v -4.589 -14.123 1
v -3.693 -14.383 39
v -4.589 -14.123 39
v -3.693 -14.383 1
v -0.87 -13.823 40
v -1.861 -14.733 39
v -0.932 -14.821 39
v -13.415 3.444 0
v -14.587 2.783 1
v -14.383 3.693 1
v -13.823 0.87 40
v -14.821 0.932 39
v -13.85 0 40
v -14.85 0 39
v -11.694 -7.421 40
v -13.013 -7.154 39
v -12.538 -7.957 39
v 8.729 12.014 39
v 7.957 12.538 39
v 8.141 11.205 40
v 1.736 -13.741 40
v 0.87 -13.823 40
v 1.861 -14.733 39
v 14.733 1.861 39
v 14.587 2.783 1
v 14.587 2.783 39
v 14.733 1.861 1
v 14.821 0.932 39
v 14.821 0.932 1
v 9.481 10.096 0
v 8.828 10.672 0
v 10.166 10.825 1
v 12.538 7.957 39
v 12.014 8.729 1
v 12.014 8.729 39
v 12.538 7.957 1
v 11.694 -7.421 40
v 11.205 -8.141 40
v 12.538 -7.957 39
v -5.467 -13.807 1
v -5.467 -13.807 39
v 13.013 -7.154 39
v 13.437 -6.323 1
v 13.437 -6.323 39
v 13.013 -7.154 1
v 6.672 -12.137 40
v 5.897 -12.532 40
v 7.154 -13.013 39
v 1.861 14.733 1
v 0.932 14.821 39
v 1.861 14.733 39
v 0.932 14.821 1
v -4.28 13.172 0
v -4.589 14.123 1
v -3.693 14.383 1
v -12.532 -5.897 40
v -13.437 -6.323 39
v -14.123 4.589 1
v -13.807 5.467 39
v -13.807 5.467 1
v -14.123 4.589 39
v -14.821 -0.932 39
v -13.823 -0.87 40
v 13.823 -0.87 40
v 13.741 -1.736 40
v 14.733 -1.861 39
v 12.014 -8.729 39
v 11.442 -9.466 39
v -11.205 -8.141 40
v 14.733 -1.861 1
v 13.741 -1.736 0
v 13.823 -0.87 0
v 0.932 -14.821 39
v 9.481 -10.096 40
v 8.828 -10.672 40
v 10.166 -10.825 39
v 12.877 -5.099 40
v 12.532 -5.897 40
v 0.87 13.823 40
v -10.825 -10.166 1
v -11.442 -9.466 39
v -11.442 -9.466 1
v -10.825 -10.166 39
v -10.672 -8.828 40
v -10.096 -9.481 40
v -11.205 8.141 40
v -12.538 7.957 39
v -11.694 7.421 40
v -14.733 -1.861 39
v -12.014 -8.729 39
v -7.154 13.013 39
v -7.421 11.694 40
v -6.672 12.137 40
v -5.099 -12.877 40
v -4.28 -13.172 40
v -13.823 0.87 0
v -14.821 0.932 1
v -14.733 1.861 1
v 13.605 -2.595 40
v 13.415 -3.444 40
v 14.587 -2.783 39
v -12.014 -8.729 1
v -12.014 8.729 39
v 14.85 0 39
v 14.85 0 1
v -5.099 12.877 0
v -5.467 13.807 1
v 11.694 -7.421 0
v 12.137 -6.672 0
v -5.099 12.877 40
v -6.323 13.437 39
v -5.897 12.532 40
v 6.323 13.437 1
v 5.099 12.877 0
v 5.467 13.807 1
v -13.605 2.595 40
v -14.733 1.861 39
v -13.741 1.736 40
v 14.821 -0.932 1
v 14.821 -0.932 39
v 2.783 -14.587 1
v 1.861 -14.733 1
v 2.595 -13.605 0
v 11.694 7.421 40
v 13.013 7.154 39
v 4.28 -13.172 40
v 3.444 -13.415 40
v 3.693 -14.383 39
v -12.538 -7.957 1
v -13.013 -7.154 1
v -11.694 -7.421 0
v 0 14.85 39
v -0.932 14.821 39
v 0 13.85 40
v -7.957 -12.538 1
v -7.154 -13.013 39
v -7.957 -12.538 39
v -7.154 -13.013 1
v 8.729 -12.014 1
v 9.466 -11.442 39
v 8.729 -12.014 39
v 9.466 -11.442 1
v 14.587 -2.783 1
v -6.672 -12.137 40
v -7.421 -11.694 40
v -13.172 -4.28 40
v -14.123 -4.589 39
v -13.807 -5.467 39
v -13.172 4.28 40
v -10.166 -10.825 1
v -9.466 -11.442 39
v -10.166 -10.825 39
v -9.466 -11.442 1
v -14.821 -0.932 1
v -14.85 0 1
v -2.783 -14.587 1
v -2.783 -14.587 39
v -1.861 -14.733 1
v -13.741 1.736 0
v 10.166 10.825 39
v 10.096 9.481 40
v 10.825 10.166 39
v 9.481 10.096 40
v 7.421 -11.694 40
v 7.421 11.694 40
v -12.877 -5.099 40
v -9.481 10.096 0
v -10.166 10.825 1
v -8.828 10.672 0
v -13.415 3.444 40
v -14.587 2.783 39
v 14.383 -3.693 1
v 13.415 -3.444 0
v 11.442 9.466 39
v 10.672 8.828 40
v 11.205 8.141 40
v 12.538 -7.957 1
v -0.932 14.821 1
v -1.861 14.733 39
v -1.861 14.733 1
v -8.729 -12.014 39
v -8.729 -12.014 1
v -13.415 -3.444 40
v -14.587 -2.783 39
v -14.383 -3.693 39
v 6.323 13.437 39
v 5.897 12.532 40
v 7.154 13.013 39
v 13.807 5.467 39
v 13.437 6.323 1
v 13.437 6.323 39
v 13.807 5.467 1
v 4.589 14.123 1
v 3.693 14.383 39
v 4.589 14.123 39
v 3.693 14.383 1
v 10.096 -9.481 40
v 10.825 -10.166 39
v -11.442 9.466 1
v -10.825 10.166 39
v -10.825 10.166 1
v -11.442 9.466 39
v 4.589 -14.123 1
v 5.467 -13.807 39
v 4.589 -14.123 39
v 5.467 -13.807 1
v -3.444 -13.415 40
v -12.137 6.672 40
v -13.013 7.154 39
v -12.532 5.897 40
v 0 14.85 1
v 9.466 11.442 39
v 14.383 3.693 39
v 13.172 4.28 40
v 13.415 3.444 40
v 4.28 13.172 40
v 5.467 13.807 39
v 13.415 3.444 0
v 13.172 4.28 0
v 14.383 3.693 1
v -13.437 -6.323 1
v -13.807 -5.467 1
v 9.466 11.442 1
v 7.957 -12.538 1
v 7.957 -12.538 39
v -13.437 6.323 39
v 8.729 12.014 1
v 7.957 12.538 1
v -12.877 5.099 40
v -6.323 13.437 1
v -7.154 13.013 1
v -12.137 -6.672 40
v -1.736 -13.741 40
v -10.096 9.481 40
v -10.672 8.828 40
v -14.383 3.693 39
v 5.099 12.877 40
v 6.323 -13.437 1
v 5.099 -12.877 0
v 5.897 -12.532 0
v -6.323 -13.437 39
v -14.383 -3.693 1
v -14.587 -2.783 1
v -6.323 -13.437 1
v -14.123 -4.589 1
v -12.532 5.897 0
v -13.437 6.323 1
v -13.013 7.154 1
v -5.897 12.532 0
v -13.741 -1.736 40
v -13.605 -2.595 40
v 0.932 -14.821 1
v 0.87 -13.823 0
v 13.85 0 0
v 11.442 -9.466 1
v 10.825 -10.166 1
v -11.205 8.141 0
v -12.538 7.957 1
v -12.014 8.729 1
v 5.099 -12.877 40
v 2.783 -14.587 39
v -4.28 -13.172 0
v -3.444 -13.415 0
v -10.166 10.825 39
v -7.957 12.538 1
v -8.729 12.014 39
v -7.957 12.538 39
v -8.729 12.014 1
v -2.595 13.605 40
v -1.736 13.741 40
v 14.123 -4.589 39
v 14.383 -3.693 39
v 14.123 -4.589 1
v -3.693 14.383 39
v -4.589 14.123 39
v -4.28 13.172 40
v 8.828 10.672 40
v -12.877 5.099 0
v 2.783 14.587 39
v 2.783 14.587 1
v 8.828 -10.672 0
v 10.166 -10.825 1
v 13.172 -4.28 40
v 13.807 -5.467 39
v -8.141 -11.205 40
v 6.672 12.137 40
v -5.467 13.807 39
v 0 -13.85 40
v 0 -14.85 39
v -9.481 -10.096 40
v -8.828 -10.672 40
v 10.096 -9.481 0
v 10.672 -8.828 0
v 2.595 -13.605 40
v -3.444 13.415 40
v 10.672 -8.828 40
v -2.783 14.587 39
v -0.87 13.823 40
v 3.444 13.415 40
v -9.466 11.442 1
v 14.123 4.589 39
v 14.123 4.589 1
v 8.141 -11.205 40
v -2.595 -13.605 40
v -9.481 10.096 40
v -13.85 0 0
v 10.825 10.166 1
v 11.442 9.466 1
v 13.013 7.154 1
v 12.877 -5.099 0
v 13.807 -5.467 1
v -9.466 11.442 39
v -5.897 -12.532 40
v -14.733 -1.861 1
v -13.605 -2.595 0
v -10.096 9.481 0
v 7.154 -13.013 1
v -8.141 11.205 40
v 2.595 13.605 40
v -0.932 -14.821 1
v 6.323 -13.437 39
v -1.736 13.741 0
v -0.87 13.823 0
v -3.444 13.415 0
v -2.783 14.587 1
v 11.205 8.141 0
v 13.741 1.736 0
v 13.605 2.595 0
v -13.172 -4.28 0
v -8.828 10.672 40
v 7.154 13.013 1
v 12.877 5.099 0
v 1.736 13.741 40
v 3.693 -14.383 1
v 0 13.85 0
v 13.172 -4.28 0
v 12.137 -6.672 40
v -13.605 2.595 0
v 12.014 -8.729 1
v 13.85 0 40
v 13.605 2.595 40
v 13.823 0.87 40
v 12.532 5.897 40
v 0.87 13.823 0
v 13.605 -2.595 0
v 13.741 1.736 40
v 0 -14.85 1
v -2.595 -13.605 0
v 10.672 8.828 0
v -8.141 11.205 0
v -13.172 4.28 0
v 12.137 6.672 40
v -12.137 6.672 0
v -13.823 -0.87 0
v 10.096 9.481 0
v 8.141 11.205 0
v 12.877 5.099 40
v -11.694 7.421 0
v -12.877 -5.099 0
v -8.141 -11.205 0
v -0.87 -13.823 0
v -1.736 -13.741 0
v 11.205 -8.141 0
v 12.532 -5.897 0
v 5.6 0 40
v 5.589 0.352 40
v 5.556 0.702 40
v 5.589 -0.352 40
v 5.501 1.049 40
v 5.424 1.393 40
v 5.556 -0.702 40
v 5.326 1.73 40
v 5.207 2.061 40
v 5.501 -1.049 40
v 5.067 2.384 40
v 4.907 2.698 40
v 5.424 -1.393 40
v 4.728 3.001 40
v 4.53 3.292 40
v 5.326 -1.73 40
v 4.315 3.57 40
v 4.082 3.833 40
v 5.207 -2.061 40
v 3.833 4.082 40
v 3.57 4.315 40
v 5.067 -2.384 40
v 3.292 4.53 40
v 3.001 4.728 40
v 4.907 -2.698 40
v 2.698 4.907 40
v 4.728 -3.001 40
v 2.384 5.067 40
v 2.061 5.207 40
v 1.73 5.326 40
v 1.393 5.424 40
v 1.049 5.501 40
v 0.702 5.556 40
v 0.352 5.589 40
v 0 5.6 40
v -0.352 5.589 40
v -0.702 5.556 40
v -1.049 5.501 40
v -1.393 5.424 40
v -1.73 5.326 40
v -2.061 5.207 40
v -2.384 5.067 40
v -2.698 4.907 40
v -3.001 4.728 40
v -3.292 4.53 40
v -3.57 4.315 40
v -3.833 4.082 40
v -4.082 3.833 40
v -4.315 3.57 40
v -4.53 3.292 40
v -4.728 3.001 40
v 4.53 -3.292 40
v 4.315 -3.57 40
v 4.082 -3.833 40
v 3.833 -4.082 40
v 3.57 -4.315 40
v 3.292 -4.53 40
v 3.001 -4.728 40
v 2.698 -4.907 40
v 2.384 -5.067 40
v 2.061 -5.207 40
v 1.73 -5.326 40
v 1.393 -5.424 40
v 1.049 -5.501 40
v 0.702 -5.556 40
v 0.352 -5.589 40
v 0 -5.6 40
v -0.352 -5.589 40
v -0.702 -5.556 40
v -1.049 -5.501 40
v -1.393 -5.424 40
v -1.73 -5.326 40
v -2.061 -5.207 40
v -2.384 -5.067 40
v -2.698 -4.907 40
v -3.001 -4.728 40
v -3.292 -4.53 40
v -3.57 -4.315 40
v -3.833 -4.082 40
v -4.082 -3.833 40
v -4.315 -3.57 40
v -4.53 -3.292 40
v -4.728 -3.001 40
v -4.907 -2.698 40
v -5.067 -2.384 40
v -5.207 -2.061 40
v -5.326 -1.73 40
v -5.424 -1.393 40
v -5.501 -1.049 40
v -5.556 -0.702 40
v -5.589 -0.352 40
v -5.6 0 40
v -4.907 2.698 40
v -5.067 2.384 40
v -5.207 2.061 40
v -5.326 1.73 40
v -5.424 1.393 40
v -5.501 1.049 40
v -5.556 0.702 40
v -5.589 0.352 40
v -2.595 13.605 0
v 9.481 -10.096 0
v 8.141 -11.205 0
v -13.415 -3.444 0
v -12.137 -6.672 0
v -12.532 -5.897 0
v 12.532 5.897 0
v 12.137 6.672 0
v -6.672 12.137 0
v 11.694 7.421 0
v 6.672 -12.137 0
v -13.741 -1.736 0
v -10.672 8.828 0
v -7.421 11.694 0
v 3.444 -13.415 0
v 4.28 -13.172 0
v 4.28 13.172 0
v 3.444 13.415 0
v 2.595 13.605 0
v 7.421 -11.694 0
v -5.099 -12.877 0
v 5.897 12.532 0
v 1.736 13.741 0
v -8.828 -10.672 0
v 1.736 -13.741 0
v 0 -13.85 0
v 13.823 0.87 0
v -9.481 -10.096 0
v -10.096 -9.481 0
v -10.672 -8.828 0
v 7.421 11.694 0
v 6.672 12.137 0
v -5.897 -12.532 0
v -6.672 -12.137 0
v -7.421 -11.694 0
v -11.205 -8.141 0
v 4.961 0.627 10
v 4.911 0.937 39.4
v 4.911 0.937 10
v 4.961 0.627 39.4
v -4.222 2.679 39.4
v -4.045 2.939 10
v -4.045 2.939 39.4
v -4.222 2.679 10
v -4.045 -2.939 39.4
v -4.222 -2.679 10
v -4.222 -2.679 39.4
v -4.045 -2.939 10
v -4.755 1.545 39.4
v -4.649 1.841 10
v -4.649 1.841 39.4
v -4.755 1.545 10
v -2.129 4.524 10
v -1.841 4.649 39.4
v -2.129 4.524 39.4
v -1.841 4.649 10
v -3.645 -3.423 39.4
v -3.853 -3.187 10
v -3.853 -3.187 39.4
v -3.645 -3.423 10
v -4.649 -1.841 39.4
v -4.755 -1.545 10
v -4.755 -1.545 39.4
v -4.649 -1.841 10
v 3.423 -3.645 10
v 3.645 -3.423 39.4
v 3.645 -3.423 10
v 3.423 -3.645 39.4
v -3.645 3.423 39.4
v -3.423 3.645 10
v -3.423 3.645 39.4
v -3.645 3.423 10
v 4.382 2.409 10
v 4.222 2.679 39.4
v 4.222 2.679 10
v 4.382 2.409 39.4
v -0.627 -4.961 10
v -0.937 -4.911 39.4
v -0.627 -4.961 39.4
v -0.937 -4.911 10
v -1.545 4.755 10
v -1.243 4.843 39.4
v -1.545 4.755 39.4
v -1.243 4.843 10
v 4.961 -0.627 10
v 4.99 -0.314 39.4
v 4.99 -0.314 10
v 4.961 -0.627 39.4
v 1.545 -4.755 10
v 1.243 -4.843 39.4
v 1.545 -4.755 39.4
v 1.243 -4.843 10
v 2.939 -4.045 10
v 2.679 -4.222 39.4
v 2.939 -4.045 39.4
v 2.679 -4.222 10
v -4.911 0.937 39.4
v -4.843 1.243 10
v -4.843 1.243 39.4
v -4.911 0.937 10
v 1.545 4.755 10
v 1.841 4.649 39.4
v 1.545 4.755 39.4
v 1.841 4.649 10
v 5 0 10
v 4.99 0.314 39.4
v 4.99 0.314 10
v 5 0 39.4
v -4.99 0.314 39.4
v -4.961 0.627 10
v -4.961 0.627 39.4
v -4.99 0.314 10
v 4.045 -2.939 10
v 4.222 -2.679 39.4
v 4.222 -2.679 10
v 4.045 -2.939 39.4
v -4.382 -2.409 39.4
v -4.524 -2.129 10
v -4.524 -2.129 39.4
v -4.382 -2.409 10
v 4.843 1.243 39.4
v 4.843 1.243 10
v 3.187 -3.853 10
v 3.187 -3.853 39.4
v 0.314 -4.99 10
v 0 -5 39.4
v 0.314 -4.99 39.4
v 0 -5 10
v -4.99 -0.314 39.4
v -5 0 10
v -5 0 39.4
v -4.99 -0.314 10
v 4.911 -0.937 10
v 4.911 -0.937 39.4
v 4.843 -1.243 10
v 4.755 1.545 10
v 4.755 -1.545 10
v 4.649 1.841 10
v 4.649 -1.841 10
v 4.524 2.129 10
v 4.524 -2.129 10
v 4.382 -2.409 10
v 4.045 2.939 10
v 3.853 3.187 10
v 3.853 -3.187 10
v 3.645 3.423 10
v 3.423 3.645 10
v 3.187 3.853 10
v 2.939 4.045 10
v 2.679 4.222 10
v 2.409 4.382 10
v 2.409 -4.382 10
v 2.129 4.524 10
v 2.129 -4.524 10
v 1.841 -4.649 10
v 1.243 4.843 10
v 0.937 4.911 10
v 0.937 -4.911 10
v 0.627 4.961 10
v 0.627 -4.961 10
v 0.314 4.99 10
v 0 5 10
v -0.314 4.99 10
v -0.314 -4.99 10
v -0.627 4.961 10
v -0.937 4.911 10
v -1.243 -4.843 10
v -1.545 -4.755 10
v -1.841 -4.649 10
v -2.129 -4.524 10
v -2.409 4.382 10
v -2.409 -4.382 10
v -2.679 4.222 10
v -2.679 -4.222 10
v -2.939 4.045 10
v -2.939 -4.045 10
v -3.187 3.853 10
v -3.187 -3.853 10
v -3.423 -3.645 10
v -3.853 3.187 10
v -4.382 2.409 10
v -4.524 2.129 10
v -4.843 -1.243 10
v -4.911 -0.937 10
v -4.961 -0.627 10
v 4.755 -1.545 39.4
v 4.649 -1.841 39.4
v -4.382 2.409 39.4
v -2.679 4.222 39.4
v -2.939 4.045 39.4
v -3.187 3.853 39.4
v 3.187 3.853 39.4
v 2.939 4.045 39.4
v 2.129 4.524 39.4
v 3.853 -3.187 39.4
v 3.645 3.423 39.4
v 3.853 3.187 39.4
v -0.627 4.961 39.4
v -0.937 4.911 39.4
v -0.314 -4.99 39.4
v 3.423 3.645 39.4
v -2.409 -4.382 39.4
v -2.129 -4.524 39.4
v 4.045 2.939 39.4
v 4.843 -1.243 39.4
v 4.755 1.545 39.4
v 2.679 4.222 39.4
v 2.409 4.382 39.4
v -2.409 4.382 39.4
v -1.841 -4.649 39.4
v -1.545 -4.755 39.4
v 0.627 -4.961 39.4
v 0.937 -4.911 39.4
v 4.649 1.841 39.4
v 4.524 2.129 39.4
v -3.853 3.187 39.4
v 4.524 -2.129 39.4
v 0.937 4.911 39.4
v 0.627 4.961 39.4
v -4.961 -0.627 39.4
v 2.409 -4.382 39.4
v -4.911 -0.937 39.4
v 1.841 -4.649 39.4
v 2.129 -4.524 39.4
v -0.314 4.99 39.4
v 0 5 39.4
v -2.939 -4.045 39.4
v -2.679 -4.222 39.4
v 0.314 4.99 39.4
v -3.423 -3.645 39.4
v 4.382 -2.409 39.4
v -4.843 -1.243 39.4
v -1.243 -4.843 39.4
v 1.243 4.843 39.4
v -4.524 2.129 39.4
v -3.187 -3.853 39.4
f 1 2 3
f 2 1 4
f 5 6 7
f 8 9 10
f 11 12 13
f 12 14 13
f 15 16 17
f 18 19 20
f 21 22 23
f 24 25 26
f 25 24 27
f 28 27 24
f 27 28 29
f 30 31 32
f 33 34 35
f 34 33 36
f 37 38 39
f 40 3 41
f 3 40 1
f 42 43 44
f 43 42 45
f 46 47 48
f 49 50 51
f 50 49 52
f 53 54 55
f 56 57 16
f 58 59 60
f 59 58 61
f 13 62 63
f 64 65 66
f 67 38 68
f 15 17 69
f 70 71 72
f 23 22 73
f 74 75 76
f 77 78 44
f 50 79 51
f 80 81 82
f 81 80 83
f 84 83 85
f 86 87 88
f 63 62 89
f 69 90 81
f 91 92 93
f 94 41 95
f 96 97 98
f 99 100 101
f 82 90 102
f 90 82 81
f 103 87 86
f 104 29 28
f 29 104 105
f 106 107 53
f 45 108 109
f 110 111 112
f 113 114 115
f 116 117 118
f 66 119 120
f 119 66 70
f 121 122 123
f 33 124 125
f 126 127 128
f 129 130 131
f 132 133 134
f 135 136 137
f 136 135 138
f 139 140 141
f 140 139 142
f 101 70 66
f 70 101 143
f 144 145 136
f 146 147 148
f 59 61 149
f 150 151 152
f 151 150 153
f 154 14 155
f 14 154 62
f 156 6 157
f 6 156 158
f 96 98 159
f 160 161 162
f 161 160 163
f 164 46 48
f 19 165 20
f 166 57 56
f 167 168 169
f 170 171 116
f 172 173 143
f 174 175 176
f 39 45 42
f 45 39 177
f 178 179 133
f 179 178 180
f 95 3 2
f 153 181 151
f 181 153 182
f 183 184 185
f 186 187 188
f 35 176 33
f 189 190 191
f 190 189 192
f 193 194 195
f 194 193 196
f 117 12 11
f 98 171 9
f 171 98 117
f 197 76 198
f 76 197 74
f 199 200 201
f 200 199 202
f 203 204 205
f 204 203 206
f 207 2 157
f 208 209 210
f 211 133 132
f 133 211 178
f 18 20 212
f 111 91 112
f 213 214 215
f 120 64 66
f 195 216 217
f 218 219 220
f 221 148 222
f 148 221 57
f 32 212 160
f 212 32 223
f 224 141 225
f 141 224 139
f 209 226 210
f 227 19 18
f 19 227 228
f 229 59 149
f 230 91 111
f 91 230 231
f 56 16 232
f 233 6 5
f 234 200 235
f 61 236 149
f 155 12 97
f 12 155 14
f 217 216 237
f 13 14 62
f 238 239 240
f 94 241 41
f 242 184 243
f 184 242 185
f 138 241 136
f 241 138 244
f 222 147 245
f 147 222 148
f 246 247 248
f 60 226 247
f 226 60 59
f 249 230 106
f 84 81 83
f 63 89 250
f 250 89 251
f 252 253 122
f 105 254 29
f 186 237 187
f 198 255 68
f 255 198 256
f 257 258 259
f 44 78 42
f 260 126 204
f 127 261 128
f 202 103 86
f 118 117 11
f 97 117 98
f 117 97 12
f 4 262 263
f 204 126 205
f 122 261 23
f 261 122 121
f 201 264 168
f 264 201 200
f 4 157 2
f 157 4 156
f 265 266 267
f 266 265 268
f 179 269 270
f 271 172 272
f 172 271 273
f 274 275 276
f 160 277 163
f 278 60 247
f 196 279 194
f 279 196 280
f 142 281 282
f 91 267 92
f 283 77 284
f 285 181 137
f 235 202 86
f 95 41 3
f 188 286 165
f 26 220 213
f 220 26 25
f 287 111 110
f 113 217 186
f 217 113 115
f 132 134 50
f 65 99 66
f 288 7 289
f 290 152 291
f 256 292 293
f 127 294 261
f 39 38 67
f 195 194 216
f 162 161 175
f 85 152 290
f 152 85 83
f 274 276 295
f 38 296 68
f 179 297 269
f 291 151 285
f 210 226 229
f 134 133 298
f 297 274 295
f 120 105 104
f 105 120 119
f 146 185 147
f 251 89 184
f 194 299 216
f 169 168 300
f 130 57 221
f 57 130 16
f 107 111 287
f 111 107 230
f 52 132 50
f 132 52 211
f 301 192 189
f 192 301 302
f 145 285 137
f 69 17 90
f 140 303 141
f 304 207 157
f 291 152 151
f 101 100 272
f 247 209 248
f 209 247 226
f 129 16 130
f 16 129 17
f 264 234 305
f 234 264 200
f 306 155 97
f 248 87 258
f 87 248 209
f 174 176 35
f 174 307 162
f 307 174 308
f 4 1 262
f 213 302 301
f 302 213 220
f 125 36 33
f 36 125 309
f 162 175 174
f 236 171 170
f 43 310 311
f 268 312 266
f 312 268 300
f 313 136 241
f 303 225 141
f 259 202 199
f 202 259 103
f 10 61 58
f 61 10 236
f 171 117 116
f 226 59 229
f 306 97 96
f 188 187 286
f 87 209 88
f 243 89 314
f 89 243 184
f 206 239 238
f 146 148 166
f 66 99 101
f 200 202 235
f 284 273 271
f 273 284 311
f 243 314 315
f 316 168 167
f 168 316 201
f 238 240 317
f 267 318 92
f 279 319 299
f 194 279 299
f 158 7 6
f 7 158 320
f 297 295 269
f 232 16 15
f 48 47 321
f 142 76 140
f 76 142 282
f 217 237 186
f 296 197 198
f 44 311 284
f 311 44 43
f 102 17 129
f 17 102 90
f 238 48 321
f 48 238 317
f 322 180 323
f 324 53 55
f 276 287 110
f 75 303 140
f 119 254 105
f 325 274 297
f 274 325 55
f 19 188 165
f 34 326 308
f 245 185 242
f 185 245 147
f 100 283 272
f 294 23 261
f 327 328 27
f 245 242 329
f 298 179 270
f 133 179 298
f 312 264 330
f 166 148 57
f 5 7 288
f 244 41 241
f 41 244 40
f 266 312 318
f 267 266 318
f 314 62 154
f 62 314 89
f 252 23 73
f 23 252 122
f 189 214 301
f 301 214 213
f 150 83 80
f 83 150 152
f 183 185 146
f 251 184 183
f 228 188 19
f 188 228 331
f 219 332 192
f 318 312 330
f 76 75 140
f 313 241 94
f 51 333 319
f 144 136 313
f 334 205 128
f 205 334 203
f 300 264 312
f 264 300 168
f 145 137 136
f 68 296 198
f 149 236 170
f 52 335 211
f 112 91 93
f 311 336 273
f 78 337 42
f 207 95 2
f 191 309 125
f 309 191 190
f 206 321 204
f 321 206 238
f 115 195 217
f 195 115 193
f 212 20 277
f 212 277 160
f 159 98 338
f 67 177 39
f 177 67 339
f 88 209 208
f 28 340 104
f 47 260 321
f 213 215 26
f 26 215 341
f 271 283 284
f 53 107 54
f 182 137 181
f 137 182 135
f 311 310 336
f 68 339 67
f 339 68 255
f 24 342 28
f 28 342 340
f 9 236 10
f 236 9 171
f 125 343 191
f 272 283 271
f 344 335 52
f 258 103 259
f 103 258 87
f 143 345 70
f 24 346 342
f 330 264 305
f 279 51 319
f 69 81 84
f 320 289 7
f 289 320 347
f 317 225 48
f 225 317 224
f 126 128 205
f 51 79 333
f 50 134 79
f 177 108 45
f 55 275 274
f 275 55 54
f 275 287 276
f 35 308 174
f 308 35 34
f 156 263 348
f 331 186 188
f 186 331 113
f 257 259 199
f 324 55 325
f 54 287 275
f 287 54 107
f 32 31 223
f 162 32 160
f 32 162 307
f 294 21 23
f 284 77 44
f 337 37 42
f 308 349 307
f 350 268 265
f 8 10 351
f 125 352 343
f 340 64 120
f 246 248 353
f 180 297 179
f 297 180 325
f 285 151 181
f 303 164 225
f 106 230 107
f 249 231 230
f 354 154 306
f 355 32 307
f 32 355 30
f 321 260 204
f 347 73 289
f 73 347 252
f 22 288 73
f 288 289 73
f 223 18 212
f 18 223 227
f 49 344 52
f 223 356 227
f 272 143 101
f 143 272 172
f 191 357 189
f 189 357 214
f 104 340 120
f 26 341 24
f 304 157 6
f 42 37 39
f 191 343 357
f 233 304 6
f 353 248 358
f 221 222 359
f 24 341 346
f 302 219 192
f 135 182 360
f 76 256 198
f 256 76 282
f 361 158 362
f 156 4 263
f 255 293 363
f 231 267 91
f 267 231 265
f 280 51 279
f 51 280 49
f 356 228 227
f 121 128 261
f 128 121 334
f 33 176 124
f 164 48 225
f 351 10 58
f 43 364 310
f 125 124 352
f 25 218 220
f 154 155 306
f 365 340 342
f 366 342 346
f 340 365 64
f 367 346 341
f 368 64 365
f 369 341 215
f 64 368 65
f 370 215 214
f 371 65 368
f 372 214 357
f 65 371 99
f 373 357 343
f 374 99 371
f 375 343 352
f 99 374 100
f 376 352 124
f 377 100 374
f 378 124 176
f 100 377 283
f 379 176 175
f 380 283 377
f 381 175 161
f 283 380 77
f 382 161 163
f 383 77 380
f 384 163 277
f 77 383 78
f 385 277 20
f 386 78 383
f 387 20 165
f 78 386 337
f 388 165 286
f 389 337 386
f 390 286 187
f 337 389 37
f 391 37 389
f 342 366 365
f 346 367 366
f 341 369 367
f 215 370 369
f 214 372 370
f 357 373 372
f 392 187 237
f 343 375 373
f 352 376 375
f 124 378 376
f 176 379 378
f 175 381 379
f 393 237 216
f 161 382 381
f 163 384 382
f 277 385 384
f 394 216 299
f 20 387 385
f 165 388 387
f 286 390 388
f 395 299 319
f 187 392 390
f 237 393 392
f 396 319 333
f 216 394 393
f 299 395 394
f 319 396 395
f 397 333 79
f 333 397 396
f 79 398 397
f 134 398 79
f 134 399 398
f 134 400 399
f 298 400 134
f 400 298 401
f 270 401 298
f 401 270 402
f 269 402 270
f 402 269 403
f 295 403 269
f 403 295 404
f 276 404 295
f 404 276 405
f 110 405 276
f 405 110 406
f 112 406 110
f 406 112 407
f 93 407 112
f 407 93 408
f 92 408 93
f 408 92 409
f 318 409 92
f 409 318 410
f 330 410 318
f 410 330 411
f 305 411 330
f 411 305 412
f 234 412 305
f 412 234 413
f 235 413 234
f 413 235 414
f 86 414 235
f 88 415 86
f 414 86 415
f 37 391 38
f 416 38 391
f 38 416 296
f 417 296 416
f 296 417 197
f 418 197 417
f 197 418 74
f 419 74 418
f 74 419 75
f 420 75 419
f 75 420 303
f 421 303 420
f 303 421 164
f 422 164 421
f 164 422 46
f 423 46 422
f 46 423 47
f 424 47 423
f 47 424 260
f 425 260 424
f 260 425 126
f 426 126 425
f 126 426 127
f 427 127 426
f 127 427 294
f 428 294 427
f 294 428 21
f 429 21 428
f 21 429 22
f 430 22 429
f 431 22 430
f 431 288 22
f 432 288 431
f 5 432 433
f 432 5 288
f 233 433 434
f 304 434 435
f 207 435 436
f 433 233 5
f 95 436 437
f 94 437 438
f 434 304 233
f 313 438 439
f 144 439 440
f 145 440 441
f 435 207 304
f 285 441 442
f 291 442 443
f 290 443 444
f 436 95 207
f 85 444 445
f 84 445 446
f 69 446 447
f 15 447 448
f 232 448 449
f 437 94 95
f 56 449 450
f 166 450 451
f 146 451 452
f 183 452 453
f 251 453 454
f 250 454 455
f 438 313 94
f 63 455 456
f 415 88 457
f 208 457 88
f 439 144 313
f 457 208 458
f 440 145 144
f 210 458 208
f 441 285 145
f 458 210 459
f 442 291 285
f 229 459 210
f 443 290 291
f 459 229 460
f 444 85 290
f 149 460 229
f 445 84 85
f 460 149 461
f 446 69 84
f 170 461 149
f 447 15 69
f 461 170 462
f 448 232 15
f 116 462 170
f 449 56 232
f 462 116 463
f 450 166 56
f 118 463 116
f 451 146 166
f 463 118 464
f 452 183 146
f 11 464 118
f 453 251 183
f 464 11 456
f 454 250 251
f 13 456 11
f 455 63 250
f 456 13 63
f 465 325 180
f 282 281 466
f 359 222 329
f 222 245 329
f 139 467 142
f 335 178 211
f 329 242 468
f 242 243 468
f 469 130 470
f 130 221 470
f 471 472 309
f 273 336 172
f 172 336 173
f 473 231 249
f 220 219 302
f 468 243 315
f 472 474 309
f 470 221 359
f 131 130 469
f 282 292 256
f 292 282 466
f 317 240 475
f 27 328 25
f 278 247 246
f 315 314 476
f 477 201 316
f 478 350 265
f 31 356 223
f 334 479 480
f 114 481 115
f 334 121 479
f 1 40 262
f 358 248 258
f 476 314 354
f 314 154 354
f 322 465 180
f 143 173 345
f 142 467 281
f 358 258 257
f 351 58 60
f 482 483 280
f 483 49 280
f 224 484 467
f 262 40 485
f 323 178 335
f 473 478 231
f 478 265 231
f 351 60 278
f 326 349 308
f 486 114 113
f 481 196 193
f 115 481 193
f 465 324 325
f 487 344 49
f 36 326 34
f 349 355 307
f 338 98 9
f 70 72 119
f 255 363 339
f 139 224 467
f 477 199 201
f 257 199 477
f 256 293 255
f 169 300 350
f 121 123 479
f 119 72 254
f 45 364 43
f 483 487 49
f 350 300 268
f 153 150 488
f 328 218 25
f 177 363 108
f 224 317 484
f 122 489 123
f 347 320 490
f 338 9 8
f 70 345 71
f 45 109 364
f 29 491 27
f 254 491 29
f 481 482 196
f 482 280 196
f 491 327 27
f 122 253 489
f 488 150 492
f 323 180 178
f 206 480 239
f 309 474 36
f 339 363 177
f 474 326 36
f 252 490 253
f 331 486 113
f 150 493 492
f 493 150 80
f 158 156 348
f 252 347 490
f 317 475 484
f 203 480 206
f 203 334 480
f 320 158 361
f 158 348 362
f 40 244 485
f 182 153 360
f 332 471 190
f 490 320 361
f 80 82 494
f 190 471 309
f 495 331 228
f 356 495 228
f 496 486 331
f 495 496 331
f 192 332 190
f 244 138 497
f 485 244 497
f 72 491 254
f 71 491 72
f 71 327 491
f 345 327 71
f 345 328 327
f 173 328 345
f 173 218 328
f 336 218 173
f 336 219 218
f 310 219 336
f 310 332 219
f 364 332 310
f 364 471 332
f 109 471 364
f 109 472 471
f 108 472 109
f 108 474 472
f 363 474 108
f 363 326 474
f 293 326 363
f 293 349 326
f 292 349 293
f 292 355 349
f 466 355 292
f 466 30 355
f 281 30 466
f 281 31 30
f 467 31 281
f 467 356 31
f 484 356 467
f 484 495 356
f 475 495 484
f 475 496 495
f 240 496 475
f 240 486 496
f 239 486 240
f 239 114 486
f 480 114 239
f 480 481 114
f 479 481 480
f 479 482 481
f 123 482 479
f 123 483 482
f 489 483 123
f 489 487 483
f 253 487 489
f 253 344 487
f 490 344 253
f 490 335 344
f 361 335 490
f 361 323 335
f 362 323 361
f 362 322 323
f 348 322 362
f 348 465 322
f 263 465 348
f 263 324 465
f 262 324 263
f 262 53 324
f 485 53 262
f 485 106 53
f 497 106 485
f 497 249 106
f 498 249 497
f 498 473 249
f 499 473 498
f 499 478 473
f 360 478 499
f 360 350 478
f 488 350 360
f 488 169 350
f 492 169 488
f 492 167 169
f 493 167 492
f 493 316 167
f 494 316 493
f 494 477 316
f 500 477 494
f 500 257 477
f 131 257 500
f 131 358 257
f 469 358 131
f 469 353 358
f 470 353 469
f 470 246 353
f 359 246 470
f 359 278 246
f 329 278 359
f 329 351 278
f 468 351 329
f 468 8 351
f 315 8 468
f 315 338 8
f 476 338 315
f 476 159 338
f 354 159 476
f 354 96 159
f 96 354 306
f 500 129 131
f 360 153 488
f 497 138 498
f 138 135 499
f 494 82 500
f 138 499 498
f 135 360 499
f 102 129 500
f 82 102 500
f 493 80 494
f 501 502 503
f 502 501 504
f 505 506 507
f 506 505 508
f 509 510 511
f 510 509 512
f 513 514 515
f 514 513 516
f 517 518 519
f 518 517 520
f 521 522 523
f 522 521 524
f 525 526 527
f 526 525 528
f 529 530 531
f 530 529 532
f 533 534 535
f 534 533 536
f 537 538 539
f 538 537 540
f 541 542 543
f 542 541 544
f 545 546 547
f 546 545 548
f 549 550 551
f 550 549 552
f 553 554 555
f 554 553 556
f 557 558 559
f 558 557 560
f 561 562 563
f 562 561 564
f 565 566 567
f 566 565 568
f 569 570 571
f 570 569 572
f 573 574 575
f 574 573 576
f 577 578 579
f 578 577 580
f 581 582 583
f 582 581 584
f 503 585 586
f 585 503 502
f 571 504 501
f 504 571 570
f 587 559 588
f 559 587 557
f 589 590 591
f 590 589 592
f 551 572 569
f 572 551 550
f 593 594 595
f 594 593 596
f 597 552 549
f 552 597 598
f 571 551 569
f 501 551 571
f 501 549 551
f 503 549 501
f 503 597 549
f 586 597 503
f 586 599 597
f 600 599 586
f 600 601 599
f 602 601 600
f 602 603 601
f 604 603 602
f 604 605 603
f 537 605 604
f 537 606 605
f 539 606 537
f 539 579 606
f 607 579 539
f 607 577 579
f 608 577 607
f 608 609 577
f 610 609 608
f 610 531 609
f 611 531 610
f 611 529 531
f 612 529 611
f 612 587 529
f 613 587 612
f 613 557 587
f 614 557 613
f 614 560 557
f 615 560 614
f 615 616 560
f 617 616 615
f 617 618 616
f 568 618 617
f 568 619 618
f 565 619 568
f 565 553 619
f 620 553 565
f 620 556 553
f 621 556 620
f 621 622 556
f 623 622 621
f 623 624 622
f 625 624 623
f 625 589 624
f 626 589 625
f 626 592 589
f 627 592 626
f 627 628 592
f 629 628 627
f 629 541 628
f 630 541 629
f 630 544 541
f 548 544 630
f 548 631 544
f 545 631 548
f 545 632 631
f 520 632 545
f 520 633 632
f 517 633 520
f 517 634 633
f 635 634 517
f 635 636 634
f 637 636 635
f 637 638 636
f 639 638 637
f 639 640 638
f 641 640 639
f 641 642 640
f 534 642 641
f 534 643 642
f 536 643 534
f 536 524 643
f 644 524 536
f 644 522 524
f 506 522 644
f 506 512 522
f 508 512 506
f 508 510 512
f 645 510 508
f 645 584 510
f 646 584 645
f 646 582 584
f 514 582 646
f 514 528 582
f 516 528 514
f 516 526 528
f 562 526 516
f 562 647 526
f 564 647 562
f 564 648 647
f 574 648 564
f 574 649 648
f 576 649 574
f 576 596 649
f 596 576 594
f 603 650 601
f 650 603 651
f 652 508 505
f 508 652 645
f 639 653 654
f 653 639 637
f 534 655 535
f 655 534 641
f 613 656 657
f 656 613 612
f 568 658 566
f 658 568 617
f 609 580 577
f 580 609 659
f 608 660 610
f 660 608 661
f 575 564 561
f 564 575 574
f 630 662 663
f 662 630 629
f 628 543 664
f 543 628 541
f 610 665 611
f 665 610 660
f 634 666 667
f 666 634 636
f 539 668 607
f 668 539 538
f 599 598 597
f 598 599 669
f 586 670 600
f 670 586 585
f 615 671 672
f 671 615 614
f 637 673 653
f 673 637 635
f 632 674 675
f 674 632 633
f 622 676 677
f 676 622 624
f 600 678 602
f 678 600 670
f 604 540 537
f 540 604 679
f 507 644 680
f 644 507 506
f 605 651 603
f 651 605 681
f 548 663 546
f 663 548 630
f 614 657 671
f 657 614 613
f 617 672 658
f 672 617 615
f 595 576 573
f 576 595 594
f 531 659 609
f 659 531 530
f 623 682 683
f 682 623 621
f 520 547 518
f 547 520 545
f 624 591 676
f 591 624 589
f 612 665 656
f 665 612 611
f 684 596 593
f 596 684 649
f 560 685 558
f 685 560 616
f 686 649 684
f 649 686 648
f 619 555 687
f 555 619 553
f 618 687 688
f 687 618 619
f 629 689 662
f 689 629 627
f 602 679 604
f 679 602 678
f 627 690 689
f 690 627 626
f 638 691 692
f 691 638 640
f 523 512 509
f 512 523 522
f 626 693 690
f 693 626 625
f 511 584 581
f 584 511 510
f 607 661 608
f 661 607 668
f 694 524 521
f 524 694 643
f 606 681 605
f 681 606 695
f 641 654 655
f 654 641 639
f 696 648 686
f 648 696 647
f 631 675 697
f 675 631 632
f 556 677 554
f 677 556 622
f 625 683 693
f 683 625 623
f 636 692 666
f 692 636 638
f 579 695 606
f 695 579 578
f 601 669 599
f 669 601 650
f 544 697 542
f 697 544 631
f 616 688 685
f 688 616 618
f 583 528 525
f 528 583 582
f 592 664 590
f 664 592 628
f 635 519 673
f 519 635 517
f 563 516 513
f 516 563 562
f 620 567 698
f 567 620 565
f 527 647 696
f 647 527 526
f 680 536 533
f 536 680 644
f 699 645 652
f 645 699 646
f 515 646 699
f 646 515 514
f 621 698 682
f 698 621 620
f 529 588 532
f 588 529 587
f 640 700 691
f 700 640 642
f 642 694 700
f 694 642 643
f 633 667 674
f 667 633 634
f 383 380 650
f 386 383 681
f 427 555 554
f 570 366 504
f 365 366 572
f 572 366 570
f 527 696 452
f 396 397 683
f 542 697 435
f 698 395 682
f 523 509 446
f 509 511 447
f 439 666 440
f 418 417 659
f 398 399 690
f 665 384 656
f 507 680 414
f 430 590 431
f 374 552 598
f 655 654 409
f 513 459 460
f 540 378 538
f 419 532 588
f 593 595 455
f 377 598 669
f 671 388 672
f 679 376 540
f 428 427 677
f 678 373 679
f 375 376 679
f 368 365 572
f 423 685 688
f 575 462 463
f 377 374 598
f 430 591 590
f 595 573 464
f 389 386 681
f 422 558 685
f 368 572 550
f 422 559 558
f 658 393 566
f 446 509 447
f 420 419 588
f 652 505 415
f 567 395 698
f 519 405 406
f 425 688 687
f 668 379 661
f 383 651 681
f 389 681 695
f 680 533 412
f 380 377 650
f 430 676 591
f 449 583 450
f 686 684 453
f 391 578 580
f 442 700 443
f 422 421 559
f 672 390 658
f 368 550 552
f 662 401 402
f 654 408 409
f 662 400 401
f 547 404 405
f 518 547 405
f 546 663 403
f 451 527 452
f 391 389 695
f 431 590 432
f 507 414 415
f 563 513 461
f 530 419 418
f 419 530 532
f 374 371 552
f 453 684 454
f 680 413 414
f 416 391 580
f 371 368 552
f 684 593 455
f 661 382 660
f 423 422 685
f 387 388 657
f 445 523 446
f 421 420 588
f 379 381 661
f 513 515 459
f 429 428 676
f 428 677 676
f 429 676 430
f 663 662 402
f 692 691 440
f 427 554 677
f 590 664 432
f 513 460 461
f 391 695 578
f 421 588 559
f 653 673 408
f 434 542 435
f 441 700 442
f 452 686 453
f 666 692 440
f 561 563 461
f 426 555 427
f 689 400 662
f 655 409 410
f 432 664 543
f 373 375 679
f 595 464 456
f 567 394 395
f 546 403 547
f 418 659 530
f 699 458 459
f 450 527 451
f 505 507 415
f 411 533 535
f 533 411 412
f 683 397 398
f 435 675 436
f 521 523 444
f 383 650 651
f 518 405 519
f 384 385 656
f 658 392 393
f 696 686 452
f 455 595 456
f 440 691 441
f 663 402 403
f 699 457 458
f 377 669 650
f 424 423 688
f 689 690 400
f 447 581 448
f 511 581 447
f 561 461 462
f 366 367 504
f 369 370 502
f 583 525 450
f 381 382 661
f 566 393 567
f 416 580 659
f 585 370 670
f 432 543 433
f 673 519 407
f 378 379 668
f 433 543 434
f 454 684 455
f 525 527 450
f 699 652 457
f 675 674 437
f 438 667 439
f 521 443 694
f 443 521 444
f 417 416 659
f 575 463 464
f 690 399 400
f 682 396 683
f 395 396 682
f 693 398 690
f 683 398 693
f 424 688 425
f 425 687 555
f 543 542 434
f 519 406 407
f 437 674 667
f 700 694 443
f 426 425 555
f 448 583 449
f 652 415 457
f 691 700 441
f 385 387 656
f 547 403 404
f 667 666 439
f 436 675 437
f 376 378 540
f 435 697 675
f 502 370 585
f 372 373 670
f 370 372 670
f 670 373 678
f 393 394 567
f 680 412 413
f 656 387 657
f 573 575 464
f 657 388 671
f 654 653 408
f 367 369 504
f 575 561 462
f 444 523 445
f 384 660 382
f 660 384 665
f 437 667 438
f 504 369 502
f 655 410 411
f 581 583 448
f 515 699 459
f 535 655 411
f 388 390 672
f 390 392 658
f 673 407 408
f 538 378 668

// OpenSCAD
// SPDX-License-Identifier: CC-BY-4.0
// SPDX-FileCopyrightText: 2026 Todd Sayre
// ============================================================
// Dowel end cap — a blind socket that closes off a dowel end
//
// A plain cylinder with a cylindrical recess bored into one
// end. The dowel pushes into the recess until it bottoms out;
// the remaining material caps the end.
//
// Optionally a countersunk screw hole runs through the closed
// end, so a flat-head screw can pull the cap down onto the
// dowel instead of the fit or a glue line holding it there.
//
// Modeled mouth up, closed end on the plate.
//
// The cap DEFINES its own proportions from one measurement.
// Everything is driven by the dowel diameter plus the meat you
// want around it, so the outside diameter and the overall
// length both fall out of the numbers below rather than being
// set directly.
//
// The recess is a dimension inside a hollow solid, so it is
// never measured — it is bored to the dowel diameter plus a
// clearance knob. Measure the dowel, not the hole you want.
//
// PRINT NOTES:
// - PETG or PLA, no supports needed.
// - Print as modeled, closed end down. The bore opens upward,
//   so nothing bridges, and the visible end face is laid
//   against the plate. Flipped, the bore roof has to bridge
//   its full width — it works, but it leaves a rough ceiling
//   for the dowel to bottom out against.
// - The bore prints round with the axis vertical either way.
// - Chamfers break both rims and take the elephant foot off
//   whichever end lands on the plate.
// - The countersink opens at the plate and closes in at 45
//   deg, so it is self-supporting exactly like the chamfers.
//   It makes the first layer a ring rather than a disc, which
//   costs a little bed adhesion — the end face is wide, so
//   there is plenty left.
// ============================================================

// MARK: Dimensions

// Measure the dowel at its widest
dowel_d = 9.7; // mm

// How the cap fits it
penetration_depth = 30; // mm, how far the dowel goes in
wall_meat = 10; // mm, around the dowel and over its end
// (About 1.5 dowel diameters of penetration is plenty)

// Countersunk hole for a flat-head screw into the end grain
screw_hole = false;
screw_shank_d = 3; // mm, over the threads
screw_head_d = 7; // mm, at its widest

// MARK: Tuning

dowel_clearance = 0.3; // mm, on the bore; raise if it will not seat
screw_clearance = 0.4; // mm, on both screw diameters
chamfer = 1; // mm, on both outer rims
lead_in = 0.6; // mm, funnel at the bore mouth

$fn = 100;

// MARK: Derived

bore_d = dowel_d + dowel_clearance;
cap_d = dowel_d + 2 * wall_meat;
cap_length = penetration_depth + wall_meat;
screw_shank_hole_d = screw_shank_d + screw_clearance;
screw_head_hole_d = screw_head_d + screw_clearance;

// Depth of the countersink cone. It is half the difference of the two bored
// diameters and nothing else, which is what makes the cone 45 deg to the plate
// — a 90 deg included angle, the flat-head standard — whatever screw it is cut
// for
countersink_depth = (screw_head_hole_d - screw_shank_hole_d) / 2;

// Straight-walled part of the screw hole, left under the cone. The cone eats
// down from the plate and the bore floor caps it from above, so this is what
// keeps the two from meeting
screw_seat = wall_meat - countersink_depth;

// Material left on the end face, once the outer chamfer has taken from the
// outside and the countersink mouth has opened up in the middle
end_face_ring = (cap_d - 2 * chamfer - screw_head_hole_d) / 2;

// Material left on the face of the rim, once the outer chamfer has taken from
// the outside and the lead-in funnel has taken from the inside. The cap is
// only as strong at the mouth as this, and it is the first thing a large
// chamfer or a generous lead-in eats
rim_face = (cap_d - bore_d) / 2 - chamfer - lead_in;

// MARK: Checks

echo(str("outside diameter = ", cap_d, " mm"));
echo(str("overall length = ", cap_length, " mm"));
echo(str("bored diameter = ", bore_d, " mm"));
echo(str("rim face at the mouth = ", rim_face, " mm"));

if (screw_hole) {
  echo(str("screw shank hole = ", screw_shank_hole_d, " mm"));
  echo(str("countersink mouth = ", screw_head_hole_d, " mm across, ", countersink_depth, " mm deep"));
  echo(str("straight hole under the countersink = ", screw_seat, " mm"));
  echo(str("end face ring outside the countersink = ", end_face_ring, " mm"));
}

assert(wall_meat > 0, "wall_meat has to be positive — there is no cap without material around the dowel");
assert(penetration_depth > 0, "penetration_depth has to be positive — the dowel has to go somewhere");
assert(bore_d > 0, "dowel_clearance has closed the bore — it cannot be more negative than the dowel is wide");
assert(rim_face > 0, "the mouth has no rim left — reduce chamfer or lead_in, or add wall_meat");
assert(chamfer < cap_length / 2, "the two outer chamfers have met in the middle — reduce chamfer");
assert(lead_in < penetration_depth, "the lead-in funnel is deeper than the bore — reduce lead_in");
assert(!screw_hole || screw_head_d > screw_shank_d, "screw_head_d is no wider than screw_shank_d — that screw has no head to countersink");
assert(!screw_hole || screw_shank_hole_d < bore_d, "the screw hole is wider than the bore — it would break out through the socket wall instead of into the end of the dowel");
assert(!screw_hole || screw_seat > 0, "the countersink has cut through into the bore — use a smaller screw or add wall_meat");
assert(!screw_hole || end_face_ring > 0, "the countersink has run off the end face — use a smaller screw head, reduce chamfer, or add wall_meat");

// MARK: Geometry

// Outer silhouette, revolved: a cylinder with both rims broken. x is radius
// out from the axis, y is height up from the closed end
module cap_body() {
  r = cap_d / 2;
  rotate_extrude()
    polygon([
      [0, 0],
      [r - chamfer, 0],
      [r, chamfer],
      [r, cap_length - chamfer],
      [r - chamfer, cap_length],
      [0, cap_length],
    ]);
}

module dowel_endcap() {
  difference() {
    cap_body();

    // Blind bore for the dowel, opening upward at the mouth
    translate([0, 0, wall_meat])
      cylinder(d = bore_d, h = penetration_depth + 1);

    // Funnel at the mouth, so the dowel starts square instead of
    // catching on the rim
    translate([0, 0, cap_length - lead_in])
      cylinder(d1 = bore_d, d2 = bore_d + 2 * lead_in, h = lead_in);

    if (screw_hole) {
      // Clearance hole for the shank, from the plate up through the end
      // wall and into the bore
      cylinder(d = screw_shank_hole_d, h = wall_meat + 1);

      // Countersink, so a flat head finishes flush with the end face. The
      // cone's radial change equals its height, so it stays at 45 deg to
      // the plate whatever screw it is cut for. It is dropped 1 mm below
      // the plate — which is where the 2 mm on the mouth diameter comes
      // from — so the mouth cuts cleanly instead of landing on the end
      // face as a coincident edge
      translate([0, 0, -1])
        cylinder(d1 = screw_head_hole_d + 2, d2 = screw_shank_hole_d, h = countersink_depth + 1);
    }
  }
}

dowel_endcap();
